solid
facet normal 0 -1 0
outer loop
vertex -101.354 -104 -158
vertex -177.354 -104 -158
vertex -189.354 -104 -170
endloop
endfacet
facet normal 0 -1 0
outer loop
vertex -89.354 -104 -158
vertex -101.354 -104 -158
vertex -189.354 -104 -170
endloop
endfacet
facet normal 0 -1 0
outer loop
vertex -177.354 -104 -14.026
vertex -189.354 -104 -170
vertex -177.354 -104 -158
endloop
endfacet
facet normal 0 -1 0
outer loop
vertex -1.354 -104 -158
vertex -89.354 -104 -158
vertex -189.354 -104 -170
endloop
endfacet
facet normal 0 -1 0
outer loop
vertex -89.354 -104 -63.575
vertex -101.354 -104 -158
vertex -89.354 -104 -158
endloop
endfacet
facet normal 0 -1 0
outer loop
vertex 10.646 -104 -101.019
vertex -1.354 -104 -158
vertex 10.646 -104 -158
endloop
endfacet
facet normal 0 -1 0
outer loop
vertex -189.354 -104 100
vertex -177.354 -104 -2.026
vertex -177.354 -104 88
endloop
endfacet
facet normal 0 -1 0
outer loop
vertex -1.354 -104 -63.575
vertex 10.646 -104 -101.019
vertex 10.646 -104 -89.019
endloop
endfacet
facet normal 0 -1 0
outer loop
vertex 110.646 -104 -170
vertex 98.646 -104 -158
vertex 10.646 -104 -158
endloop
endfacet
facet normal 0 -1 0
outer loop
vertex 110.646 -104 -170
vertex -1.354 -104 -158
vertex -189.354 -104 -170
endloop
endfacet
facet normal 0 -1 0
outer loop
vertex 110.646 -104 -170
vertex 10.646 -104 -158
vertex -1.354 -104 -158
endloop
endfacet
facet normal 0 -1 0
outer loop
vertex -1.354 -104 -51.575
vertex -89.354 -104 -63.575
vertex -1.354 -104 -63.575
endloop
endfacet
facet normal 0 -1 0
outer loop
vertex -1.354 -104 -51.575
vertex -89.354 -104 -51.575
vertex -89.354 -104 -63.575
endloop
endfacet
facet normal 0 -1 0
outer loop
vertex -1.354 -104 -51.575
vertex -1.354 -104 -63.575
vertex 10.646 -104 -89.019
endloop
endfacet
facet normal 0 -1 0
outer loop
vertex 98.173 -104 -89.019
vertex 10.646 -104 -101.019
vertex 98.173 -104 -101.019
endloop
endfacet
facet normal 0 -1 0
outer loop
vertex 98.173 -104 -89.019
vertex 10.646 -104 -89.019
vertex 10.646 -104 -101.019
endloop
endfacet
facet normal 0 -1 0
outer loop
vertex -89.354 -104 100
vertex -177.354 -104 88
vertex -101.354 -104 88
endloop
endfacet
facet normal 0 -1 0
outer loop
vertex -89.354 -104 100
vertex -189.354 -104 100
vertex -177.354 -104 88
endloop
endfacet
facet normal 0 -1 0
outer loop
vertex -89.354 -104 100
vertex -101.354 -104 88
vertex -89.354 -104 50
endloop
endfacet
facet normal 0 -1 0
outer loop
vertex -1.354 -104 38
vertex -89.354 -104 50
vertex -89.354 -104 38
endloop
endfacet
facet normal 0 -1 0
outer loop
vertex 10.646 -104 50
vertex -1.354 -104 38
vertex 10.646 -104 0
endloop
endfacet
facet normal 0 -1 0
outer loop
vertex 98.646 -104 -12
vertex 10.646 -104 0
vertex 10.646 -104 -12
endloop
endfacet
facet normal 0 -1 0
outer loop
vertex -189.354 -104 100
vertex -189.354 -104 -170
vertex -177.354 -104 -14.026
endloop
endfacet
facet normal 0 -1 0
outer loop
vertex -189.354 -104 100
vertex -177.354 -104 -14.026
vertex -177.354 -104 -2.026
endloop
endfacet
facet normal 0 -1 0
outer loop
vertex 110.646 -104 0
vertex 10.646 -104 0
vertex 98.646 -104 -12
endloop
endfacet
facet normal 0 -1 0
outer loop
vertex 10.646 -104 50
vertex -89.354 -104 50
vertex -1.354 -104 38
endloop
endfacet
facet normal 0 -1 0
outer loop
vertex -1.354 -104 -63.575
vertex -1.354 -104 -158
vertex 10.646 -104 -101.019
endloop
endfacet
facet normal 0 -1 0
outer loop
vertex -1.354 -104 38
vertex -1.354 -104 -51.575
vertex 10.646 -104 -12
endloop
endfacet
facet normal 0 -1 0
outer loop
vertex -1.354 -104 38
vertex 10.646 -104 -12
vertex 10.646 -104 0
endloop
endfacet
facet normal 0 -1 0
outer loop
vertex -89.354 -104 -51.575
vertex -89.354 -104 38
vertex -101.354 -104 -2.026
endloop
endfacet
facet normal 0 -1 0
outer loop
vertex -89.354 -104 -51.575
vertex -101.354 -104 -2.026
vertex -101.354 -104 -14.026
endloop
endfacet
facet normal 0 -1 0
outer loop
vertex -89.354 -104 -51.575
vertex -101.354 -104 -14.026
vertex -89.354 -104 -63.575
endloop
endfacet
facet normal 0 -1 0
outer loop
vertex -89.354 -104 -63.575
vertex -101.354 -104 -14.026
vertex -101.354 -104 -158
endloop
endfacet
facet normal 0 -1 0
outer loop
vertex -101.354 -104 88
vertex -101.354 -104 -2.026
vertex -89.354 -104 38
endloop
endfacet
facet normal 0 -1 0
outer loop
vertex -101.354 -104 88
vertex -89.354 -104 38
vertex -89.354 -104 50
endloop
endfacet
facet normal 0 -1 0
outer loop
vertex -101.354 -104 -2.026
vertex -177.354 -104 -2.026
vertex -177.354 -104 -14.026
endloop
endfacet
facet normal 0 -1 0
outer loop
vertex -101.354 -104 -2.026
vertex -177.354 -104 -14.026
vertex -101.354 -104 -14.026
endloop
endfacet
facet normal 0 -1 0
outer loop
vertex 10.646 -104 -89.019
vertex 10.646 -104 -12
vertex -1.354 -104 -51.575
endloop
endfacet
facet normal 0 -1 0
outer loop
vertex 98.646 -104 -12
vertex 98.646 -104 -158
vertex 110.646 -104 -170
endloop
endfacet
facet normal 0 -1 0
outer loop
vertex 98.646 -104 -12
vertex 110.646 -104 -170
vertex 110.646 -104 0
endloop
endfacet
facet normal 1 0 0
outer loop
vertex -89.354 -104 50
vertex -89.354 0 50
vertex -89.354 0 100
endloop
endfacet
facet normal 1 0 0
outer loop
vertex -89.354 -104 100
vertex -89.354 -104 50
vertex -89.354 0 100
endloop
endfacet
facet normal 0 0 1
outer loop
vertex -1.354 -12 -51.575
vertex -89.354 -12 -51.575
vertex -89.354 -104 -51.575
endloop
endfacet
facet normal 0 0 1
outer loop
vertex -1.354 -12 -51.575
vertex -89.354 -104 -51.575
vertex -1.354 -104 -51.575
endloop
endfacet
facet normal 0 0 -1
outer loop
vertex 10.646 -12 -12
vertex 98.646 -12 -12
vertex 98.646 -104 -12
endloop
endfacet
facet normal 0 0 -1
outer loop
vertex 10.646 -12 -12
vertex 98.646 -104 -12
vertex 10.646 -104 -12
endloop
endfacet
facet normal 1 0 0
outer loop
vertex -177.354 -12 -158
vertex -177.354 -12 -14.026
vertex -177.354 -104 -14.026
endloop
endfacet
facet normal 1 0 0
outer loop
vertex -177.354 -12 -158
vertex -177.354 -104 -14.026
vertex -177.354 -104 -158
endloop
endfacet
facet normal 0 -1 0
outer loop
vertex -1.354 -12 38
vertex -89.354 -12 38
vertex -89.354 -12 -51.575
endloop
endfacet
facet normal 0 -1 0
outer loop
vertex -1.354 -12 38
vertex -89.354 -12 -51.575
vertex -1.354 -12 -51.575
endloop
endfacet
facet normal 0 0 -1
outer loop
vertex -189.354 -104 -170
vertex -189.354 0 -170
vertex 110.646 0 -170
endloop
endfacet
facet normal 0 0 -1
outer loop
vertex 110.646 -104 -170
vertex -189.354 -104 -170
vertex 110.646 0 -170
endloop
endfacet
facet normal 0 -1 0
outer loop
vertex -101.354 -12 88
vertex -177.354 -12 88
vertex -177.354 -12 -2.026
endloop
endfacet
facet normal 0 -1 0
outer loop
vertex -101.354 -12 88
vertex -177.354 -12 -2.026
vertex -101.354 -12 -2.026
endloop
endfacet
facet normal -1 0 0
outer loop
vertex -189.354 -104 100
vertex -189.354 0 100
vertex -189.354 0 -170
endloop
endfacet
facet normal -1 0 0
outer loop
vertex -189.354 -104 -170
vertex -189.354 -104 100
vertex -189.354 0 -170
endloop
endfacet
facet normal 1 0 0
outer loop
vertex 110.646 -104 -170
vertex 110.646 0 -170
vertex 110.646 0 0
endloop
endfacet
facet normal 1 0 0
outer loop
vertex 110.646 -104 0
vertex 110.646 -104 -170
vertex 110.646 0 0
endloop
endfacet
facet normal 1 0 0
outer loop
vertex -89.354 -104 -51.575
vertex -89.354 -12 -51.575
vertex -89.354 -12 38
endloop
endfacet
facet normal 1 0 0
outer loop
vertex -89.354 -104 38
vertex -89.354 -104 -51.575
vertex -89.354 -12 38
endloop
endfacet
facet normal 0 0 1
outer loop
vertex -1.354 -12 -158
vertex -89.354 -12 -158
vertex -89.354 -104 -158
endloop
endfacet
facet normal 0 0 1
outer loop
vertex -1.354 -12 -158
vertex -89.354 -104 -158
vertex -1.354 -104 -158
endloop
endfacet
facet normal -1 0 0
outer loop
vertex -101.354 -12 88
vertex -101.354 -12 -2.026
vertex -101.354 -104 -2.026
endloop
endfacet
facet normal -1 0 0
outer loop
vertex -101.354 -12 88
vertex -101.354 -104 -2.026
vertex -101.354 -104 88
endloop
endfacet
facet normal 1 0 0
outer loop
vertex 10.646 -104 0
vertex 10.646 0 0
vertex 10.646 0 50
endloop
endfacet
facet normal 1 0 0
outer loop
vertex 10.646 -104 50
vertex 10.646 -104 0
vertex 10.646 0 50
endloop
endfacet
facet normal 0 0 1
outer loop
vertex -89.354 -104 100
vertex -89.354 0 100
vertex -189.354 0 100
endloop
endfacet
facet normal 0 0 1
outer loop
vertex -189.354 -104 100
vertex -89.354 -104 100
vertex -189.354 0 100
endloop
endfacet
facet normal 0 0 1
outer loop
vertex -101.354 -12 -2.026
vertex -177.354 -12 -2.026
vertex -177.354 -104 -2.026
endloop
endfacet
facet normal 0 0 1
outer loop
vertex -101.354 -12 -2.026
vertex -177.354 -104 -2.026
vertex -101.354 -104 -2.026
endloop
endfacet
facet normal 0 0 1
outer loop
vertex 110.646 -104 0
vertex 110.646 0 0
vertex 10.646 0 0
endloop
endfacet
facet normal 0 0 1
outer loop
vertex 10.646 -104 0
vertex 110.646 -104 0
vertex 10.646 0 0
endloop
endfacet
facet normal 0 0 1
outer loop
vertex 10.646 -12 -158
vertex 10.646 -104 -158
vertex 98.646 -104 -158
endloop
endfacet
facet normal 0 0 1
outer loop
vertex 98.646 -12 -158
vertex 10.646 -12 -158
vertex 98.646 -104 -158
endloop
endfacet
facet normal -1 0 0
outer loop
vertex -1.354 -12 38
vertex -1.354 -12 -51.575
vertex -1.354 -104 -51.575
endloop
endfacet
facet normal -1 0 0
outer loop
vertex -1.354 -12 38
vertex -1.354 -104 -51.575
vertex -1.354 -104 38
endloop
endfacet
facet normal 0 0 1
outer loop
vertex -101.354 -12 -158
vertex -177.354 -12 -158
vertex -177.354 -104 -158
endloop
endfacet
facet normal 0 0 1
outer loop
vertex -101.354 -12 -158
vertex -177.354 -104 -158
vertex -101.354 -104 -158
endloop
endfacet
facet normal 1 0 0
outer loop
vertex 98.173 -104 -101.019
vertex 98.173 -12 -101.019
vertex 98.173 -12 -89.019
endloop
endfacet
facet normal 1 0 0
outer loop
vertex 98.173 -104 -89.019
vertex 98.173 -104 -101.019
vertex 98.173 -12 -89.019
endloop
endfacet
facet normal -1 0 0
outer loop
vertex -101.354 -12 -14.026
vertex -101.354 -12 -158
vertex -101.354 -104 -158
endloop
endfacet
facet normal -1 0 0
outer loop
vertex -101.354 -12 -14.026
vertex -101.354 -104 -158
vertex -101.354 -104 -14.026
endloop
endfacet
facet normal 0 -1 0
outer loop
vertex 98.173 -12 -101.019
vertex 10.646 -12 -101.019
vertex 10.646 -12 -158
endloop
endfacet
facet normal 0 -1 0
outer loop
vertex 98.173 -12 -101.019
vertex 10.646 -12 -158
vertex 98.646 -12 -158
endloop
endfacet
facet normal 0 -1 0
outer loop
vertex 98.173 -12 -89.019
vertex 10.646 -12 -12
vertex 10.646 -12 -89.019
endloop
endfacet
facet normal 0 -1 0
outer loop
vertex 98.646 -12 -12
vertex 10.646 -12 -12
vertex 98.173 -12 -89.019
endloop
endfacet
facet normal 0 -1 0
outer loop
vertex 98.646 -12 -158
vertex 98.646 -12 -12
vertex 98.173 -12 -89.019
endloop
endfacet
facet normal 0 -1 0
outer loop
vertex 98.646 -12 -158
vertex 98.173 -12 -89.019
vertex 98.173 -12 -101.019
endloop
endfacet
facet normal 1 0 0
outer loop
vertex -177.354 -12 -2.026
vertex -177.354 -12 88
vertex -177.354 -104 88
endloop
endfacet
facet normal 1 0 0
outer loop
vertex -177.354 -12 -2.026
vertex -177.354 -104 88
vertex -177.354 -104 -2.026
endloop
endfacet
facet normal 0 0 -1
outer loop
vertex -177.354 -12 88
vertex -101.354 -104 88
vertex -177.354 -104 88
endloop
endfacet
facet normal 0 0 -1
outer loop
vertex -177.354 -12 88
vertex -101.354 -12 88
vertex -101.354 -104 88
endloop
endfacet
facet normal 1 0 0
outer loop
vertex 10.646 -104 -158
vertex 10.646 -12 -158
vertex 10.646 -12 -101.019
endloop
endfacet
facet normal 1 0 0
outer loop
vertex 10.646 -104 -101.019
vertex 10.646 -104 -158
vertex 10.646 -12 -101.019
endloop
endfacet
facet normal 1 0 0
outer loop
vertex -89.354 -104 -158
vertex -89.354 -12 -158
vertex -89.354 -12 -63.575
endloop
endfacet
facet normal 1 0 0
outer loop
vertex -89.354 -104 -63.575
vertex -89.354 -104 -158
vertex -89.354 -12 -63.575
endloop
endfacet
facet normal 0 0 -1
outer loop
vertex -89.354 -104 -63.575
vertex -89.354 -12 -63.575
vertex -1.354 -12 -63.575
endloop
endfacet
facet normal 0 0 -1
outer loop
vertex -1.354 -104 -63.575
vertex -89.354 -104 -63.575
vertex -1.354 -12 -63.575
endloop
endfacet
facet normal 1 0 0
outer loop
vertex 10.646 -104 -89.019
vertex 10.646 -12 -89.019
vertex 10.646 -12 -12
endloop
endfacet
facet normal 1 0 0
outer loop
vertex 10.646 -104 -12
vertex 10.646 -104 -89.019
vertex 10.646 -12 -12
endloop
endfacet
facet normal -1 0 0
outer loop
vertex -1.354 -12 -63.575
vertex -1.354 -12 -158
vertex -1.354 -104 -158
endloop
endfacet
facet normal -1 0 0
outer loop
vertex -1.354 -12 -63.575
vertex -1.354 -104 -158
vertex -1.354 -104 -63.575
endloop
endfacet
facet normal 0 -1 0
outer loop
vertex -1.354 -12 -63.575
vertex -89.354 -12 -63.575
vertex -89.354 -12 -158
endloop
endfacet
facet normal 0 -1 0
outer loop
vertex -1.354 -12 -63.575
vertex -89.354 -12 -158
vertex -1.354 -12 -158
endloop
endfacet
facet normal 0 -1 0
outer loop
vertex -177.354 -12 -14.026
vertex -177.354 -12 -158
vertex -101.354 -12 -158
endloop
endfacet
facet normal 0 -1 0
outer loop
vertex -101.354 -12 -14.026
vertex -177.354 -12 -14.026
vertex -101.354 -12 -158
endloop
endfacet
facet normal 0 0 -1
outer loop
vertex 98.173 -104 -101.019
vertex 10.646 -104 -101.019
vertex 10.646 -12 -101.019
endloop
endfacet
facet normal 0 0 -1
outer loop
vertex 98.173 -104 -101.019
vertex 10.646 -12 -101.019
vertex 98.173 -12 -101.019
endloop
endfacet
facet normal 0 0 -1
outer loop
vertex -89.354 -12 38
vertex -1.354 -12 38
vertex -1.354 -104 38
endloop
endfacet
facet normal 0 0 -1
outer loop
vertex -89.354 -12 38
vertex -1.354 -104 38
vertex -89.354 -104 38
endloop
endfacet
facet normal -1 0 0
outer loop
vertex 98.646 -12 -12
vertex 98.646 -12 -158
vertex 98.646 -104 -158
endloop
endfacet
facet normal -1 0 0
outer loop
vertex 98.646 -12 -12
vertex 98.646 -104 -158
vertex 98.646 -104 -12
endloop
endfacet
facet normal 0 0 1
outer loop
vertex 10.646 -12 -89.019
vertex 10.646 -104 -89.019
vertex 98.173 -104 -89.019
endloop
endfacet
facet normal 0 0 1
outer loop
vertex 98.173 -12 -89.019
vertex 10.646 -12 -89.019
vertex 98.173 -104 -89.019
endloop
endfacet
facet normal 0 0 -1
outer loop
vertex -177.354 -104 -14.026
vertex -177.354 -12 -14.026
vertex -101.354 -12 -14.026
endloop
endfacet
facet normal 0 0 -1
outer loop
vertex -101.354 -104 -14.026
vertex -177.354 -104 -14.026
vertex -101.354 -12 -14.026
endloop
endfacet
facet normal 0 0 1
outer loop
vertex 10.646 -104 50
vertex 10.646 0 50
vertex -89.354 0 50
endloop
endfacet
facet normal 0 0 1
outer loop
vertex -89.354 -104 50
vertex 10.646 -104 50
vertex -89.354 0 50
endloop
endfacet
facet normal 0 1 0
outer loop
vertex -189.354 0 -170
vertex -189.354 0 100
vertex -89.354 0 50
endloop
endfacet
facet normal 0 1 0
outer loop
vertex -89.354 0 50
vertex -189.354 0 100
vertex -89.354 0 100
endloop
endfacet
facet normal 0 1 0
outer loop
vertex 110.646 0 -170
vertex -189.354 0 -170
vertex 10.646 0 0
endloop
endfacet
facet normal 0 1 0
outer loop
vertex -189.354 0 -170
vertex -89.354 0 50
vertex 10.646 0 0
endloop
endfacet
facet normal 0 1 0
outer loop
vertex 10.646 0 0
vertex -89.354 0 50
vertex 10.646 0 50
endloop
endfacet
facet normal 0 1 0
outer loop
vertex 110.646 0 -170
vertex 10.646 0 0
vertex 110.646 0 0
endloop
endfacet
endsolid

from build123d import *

# Parameters (mm, degrees)
F1_DEPTH = 104
F2_T     = -12
F3_W     = 12
F3_H     = 196
F3_H_2   = 146
F4_DEPTH = 92
F5_W     = 76
F5_H     = 12
F5_W_2   = 89.8888036609
F5_W_3   = 87.8371410072
F6_DEPTH = 92


with BuildPart() as f1:
    # F0 (on Front) → F1 (new body)
    with BuildSketch(Plane.XZ):
        Polygon((-189.3542973706, 100), (-189.3542973706, -170), (110.6457026294, -170), (110.6457026294, 0), (10.6457026294, 0), (10.6457026294, 50), (-89.3542973706, 50), (-89.3542973706, 100), align=None)
    extrude(amount=F1_DEPTH)

    # F2
    f2_openings = [f1.faces().sort_by_distance(p)[0] for p in [
        (-54.505813, -104, -56.212121),
    ]]
    offset(amount=F2_T, openings=f2_openings, kind=Kind.INTERSECTION)

    # F3 (on face) → F4 (join)
    with BuildSketch(Plane.XZ.offset(12)):
        with Locations((-95.3542973706, -60)):
            Rectangle(F3_W, F3_H)
        with Locations((4.6457026294, -85)):
            Rectangle(F3_W, F3_H_2)
    extrude(amount=F4_DEPTH)

    # F5 (on face) → F6 (join)
    with BuildSketch(Plane.XZ.offset(12)):
        with Locations((-139.3542973706, -8.0260672197)):
            Rectangle(F5_W, F5_H)
        with Locations((-44.9444018304, -57.5752230883)):
            Rectangle(F5_W_2, F5_H)
        with Locations((54.2541909963, -95.0186225176)):
            Rectangle(F5_W_3, F5_H)
    extrude(amount=F6_DEPTH)


solid = f1.part
